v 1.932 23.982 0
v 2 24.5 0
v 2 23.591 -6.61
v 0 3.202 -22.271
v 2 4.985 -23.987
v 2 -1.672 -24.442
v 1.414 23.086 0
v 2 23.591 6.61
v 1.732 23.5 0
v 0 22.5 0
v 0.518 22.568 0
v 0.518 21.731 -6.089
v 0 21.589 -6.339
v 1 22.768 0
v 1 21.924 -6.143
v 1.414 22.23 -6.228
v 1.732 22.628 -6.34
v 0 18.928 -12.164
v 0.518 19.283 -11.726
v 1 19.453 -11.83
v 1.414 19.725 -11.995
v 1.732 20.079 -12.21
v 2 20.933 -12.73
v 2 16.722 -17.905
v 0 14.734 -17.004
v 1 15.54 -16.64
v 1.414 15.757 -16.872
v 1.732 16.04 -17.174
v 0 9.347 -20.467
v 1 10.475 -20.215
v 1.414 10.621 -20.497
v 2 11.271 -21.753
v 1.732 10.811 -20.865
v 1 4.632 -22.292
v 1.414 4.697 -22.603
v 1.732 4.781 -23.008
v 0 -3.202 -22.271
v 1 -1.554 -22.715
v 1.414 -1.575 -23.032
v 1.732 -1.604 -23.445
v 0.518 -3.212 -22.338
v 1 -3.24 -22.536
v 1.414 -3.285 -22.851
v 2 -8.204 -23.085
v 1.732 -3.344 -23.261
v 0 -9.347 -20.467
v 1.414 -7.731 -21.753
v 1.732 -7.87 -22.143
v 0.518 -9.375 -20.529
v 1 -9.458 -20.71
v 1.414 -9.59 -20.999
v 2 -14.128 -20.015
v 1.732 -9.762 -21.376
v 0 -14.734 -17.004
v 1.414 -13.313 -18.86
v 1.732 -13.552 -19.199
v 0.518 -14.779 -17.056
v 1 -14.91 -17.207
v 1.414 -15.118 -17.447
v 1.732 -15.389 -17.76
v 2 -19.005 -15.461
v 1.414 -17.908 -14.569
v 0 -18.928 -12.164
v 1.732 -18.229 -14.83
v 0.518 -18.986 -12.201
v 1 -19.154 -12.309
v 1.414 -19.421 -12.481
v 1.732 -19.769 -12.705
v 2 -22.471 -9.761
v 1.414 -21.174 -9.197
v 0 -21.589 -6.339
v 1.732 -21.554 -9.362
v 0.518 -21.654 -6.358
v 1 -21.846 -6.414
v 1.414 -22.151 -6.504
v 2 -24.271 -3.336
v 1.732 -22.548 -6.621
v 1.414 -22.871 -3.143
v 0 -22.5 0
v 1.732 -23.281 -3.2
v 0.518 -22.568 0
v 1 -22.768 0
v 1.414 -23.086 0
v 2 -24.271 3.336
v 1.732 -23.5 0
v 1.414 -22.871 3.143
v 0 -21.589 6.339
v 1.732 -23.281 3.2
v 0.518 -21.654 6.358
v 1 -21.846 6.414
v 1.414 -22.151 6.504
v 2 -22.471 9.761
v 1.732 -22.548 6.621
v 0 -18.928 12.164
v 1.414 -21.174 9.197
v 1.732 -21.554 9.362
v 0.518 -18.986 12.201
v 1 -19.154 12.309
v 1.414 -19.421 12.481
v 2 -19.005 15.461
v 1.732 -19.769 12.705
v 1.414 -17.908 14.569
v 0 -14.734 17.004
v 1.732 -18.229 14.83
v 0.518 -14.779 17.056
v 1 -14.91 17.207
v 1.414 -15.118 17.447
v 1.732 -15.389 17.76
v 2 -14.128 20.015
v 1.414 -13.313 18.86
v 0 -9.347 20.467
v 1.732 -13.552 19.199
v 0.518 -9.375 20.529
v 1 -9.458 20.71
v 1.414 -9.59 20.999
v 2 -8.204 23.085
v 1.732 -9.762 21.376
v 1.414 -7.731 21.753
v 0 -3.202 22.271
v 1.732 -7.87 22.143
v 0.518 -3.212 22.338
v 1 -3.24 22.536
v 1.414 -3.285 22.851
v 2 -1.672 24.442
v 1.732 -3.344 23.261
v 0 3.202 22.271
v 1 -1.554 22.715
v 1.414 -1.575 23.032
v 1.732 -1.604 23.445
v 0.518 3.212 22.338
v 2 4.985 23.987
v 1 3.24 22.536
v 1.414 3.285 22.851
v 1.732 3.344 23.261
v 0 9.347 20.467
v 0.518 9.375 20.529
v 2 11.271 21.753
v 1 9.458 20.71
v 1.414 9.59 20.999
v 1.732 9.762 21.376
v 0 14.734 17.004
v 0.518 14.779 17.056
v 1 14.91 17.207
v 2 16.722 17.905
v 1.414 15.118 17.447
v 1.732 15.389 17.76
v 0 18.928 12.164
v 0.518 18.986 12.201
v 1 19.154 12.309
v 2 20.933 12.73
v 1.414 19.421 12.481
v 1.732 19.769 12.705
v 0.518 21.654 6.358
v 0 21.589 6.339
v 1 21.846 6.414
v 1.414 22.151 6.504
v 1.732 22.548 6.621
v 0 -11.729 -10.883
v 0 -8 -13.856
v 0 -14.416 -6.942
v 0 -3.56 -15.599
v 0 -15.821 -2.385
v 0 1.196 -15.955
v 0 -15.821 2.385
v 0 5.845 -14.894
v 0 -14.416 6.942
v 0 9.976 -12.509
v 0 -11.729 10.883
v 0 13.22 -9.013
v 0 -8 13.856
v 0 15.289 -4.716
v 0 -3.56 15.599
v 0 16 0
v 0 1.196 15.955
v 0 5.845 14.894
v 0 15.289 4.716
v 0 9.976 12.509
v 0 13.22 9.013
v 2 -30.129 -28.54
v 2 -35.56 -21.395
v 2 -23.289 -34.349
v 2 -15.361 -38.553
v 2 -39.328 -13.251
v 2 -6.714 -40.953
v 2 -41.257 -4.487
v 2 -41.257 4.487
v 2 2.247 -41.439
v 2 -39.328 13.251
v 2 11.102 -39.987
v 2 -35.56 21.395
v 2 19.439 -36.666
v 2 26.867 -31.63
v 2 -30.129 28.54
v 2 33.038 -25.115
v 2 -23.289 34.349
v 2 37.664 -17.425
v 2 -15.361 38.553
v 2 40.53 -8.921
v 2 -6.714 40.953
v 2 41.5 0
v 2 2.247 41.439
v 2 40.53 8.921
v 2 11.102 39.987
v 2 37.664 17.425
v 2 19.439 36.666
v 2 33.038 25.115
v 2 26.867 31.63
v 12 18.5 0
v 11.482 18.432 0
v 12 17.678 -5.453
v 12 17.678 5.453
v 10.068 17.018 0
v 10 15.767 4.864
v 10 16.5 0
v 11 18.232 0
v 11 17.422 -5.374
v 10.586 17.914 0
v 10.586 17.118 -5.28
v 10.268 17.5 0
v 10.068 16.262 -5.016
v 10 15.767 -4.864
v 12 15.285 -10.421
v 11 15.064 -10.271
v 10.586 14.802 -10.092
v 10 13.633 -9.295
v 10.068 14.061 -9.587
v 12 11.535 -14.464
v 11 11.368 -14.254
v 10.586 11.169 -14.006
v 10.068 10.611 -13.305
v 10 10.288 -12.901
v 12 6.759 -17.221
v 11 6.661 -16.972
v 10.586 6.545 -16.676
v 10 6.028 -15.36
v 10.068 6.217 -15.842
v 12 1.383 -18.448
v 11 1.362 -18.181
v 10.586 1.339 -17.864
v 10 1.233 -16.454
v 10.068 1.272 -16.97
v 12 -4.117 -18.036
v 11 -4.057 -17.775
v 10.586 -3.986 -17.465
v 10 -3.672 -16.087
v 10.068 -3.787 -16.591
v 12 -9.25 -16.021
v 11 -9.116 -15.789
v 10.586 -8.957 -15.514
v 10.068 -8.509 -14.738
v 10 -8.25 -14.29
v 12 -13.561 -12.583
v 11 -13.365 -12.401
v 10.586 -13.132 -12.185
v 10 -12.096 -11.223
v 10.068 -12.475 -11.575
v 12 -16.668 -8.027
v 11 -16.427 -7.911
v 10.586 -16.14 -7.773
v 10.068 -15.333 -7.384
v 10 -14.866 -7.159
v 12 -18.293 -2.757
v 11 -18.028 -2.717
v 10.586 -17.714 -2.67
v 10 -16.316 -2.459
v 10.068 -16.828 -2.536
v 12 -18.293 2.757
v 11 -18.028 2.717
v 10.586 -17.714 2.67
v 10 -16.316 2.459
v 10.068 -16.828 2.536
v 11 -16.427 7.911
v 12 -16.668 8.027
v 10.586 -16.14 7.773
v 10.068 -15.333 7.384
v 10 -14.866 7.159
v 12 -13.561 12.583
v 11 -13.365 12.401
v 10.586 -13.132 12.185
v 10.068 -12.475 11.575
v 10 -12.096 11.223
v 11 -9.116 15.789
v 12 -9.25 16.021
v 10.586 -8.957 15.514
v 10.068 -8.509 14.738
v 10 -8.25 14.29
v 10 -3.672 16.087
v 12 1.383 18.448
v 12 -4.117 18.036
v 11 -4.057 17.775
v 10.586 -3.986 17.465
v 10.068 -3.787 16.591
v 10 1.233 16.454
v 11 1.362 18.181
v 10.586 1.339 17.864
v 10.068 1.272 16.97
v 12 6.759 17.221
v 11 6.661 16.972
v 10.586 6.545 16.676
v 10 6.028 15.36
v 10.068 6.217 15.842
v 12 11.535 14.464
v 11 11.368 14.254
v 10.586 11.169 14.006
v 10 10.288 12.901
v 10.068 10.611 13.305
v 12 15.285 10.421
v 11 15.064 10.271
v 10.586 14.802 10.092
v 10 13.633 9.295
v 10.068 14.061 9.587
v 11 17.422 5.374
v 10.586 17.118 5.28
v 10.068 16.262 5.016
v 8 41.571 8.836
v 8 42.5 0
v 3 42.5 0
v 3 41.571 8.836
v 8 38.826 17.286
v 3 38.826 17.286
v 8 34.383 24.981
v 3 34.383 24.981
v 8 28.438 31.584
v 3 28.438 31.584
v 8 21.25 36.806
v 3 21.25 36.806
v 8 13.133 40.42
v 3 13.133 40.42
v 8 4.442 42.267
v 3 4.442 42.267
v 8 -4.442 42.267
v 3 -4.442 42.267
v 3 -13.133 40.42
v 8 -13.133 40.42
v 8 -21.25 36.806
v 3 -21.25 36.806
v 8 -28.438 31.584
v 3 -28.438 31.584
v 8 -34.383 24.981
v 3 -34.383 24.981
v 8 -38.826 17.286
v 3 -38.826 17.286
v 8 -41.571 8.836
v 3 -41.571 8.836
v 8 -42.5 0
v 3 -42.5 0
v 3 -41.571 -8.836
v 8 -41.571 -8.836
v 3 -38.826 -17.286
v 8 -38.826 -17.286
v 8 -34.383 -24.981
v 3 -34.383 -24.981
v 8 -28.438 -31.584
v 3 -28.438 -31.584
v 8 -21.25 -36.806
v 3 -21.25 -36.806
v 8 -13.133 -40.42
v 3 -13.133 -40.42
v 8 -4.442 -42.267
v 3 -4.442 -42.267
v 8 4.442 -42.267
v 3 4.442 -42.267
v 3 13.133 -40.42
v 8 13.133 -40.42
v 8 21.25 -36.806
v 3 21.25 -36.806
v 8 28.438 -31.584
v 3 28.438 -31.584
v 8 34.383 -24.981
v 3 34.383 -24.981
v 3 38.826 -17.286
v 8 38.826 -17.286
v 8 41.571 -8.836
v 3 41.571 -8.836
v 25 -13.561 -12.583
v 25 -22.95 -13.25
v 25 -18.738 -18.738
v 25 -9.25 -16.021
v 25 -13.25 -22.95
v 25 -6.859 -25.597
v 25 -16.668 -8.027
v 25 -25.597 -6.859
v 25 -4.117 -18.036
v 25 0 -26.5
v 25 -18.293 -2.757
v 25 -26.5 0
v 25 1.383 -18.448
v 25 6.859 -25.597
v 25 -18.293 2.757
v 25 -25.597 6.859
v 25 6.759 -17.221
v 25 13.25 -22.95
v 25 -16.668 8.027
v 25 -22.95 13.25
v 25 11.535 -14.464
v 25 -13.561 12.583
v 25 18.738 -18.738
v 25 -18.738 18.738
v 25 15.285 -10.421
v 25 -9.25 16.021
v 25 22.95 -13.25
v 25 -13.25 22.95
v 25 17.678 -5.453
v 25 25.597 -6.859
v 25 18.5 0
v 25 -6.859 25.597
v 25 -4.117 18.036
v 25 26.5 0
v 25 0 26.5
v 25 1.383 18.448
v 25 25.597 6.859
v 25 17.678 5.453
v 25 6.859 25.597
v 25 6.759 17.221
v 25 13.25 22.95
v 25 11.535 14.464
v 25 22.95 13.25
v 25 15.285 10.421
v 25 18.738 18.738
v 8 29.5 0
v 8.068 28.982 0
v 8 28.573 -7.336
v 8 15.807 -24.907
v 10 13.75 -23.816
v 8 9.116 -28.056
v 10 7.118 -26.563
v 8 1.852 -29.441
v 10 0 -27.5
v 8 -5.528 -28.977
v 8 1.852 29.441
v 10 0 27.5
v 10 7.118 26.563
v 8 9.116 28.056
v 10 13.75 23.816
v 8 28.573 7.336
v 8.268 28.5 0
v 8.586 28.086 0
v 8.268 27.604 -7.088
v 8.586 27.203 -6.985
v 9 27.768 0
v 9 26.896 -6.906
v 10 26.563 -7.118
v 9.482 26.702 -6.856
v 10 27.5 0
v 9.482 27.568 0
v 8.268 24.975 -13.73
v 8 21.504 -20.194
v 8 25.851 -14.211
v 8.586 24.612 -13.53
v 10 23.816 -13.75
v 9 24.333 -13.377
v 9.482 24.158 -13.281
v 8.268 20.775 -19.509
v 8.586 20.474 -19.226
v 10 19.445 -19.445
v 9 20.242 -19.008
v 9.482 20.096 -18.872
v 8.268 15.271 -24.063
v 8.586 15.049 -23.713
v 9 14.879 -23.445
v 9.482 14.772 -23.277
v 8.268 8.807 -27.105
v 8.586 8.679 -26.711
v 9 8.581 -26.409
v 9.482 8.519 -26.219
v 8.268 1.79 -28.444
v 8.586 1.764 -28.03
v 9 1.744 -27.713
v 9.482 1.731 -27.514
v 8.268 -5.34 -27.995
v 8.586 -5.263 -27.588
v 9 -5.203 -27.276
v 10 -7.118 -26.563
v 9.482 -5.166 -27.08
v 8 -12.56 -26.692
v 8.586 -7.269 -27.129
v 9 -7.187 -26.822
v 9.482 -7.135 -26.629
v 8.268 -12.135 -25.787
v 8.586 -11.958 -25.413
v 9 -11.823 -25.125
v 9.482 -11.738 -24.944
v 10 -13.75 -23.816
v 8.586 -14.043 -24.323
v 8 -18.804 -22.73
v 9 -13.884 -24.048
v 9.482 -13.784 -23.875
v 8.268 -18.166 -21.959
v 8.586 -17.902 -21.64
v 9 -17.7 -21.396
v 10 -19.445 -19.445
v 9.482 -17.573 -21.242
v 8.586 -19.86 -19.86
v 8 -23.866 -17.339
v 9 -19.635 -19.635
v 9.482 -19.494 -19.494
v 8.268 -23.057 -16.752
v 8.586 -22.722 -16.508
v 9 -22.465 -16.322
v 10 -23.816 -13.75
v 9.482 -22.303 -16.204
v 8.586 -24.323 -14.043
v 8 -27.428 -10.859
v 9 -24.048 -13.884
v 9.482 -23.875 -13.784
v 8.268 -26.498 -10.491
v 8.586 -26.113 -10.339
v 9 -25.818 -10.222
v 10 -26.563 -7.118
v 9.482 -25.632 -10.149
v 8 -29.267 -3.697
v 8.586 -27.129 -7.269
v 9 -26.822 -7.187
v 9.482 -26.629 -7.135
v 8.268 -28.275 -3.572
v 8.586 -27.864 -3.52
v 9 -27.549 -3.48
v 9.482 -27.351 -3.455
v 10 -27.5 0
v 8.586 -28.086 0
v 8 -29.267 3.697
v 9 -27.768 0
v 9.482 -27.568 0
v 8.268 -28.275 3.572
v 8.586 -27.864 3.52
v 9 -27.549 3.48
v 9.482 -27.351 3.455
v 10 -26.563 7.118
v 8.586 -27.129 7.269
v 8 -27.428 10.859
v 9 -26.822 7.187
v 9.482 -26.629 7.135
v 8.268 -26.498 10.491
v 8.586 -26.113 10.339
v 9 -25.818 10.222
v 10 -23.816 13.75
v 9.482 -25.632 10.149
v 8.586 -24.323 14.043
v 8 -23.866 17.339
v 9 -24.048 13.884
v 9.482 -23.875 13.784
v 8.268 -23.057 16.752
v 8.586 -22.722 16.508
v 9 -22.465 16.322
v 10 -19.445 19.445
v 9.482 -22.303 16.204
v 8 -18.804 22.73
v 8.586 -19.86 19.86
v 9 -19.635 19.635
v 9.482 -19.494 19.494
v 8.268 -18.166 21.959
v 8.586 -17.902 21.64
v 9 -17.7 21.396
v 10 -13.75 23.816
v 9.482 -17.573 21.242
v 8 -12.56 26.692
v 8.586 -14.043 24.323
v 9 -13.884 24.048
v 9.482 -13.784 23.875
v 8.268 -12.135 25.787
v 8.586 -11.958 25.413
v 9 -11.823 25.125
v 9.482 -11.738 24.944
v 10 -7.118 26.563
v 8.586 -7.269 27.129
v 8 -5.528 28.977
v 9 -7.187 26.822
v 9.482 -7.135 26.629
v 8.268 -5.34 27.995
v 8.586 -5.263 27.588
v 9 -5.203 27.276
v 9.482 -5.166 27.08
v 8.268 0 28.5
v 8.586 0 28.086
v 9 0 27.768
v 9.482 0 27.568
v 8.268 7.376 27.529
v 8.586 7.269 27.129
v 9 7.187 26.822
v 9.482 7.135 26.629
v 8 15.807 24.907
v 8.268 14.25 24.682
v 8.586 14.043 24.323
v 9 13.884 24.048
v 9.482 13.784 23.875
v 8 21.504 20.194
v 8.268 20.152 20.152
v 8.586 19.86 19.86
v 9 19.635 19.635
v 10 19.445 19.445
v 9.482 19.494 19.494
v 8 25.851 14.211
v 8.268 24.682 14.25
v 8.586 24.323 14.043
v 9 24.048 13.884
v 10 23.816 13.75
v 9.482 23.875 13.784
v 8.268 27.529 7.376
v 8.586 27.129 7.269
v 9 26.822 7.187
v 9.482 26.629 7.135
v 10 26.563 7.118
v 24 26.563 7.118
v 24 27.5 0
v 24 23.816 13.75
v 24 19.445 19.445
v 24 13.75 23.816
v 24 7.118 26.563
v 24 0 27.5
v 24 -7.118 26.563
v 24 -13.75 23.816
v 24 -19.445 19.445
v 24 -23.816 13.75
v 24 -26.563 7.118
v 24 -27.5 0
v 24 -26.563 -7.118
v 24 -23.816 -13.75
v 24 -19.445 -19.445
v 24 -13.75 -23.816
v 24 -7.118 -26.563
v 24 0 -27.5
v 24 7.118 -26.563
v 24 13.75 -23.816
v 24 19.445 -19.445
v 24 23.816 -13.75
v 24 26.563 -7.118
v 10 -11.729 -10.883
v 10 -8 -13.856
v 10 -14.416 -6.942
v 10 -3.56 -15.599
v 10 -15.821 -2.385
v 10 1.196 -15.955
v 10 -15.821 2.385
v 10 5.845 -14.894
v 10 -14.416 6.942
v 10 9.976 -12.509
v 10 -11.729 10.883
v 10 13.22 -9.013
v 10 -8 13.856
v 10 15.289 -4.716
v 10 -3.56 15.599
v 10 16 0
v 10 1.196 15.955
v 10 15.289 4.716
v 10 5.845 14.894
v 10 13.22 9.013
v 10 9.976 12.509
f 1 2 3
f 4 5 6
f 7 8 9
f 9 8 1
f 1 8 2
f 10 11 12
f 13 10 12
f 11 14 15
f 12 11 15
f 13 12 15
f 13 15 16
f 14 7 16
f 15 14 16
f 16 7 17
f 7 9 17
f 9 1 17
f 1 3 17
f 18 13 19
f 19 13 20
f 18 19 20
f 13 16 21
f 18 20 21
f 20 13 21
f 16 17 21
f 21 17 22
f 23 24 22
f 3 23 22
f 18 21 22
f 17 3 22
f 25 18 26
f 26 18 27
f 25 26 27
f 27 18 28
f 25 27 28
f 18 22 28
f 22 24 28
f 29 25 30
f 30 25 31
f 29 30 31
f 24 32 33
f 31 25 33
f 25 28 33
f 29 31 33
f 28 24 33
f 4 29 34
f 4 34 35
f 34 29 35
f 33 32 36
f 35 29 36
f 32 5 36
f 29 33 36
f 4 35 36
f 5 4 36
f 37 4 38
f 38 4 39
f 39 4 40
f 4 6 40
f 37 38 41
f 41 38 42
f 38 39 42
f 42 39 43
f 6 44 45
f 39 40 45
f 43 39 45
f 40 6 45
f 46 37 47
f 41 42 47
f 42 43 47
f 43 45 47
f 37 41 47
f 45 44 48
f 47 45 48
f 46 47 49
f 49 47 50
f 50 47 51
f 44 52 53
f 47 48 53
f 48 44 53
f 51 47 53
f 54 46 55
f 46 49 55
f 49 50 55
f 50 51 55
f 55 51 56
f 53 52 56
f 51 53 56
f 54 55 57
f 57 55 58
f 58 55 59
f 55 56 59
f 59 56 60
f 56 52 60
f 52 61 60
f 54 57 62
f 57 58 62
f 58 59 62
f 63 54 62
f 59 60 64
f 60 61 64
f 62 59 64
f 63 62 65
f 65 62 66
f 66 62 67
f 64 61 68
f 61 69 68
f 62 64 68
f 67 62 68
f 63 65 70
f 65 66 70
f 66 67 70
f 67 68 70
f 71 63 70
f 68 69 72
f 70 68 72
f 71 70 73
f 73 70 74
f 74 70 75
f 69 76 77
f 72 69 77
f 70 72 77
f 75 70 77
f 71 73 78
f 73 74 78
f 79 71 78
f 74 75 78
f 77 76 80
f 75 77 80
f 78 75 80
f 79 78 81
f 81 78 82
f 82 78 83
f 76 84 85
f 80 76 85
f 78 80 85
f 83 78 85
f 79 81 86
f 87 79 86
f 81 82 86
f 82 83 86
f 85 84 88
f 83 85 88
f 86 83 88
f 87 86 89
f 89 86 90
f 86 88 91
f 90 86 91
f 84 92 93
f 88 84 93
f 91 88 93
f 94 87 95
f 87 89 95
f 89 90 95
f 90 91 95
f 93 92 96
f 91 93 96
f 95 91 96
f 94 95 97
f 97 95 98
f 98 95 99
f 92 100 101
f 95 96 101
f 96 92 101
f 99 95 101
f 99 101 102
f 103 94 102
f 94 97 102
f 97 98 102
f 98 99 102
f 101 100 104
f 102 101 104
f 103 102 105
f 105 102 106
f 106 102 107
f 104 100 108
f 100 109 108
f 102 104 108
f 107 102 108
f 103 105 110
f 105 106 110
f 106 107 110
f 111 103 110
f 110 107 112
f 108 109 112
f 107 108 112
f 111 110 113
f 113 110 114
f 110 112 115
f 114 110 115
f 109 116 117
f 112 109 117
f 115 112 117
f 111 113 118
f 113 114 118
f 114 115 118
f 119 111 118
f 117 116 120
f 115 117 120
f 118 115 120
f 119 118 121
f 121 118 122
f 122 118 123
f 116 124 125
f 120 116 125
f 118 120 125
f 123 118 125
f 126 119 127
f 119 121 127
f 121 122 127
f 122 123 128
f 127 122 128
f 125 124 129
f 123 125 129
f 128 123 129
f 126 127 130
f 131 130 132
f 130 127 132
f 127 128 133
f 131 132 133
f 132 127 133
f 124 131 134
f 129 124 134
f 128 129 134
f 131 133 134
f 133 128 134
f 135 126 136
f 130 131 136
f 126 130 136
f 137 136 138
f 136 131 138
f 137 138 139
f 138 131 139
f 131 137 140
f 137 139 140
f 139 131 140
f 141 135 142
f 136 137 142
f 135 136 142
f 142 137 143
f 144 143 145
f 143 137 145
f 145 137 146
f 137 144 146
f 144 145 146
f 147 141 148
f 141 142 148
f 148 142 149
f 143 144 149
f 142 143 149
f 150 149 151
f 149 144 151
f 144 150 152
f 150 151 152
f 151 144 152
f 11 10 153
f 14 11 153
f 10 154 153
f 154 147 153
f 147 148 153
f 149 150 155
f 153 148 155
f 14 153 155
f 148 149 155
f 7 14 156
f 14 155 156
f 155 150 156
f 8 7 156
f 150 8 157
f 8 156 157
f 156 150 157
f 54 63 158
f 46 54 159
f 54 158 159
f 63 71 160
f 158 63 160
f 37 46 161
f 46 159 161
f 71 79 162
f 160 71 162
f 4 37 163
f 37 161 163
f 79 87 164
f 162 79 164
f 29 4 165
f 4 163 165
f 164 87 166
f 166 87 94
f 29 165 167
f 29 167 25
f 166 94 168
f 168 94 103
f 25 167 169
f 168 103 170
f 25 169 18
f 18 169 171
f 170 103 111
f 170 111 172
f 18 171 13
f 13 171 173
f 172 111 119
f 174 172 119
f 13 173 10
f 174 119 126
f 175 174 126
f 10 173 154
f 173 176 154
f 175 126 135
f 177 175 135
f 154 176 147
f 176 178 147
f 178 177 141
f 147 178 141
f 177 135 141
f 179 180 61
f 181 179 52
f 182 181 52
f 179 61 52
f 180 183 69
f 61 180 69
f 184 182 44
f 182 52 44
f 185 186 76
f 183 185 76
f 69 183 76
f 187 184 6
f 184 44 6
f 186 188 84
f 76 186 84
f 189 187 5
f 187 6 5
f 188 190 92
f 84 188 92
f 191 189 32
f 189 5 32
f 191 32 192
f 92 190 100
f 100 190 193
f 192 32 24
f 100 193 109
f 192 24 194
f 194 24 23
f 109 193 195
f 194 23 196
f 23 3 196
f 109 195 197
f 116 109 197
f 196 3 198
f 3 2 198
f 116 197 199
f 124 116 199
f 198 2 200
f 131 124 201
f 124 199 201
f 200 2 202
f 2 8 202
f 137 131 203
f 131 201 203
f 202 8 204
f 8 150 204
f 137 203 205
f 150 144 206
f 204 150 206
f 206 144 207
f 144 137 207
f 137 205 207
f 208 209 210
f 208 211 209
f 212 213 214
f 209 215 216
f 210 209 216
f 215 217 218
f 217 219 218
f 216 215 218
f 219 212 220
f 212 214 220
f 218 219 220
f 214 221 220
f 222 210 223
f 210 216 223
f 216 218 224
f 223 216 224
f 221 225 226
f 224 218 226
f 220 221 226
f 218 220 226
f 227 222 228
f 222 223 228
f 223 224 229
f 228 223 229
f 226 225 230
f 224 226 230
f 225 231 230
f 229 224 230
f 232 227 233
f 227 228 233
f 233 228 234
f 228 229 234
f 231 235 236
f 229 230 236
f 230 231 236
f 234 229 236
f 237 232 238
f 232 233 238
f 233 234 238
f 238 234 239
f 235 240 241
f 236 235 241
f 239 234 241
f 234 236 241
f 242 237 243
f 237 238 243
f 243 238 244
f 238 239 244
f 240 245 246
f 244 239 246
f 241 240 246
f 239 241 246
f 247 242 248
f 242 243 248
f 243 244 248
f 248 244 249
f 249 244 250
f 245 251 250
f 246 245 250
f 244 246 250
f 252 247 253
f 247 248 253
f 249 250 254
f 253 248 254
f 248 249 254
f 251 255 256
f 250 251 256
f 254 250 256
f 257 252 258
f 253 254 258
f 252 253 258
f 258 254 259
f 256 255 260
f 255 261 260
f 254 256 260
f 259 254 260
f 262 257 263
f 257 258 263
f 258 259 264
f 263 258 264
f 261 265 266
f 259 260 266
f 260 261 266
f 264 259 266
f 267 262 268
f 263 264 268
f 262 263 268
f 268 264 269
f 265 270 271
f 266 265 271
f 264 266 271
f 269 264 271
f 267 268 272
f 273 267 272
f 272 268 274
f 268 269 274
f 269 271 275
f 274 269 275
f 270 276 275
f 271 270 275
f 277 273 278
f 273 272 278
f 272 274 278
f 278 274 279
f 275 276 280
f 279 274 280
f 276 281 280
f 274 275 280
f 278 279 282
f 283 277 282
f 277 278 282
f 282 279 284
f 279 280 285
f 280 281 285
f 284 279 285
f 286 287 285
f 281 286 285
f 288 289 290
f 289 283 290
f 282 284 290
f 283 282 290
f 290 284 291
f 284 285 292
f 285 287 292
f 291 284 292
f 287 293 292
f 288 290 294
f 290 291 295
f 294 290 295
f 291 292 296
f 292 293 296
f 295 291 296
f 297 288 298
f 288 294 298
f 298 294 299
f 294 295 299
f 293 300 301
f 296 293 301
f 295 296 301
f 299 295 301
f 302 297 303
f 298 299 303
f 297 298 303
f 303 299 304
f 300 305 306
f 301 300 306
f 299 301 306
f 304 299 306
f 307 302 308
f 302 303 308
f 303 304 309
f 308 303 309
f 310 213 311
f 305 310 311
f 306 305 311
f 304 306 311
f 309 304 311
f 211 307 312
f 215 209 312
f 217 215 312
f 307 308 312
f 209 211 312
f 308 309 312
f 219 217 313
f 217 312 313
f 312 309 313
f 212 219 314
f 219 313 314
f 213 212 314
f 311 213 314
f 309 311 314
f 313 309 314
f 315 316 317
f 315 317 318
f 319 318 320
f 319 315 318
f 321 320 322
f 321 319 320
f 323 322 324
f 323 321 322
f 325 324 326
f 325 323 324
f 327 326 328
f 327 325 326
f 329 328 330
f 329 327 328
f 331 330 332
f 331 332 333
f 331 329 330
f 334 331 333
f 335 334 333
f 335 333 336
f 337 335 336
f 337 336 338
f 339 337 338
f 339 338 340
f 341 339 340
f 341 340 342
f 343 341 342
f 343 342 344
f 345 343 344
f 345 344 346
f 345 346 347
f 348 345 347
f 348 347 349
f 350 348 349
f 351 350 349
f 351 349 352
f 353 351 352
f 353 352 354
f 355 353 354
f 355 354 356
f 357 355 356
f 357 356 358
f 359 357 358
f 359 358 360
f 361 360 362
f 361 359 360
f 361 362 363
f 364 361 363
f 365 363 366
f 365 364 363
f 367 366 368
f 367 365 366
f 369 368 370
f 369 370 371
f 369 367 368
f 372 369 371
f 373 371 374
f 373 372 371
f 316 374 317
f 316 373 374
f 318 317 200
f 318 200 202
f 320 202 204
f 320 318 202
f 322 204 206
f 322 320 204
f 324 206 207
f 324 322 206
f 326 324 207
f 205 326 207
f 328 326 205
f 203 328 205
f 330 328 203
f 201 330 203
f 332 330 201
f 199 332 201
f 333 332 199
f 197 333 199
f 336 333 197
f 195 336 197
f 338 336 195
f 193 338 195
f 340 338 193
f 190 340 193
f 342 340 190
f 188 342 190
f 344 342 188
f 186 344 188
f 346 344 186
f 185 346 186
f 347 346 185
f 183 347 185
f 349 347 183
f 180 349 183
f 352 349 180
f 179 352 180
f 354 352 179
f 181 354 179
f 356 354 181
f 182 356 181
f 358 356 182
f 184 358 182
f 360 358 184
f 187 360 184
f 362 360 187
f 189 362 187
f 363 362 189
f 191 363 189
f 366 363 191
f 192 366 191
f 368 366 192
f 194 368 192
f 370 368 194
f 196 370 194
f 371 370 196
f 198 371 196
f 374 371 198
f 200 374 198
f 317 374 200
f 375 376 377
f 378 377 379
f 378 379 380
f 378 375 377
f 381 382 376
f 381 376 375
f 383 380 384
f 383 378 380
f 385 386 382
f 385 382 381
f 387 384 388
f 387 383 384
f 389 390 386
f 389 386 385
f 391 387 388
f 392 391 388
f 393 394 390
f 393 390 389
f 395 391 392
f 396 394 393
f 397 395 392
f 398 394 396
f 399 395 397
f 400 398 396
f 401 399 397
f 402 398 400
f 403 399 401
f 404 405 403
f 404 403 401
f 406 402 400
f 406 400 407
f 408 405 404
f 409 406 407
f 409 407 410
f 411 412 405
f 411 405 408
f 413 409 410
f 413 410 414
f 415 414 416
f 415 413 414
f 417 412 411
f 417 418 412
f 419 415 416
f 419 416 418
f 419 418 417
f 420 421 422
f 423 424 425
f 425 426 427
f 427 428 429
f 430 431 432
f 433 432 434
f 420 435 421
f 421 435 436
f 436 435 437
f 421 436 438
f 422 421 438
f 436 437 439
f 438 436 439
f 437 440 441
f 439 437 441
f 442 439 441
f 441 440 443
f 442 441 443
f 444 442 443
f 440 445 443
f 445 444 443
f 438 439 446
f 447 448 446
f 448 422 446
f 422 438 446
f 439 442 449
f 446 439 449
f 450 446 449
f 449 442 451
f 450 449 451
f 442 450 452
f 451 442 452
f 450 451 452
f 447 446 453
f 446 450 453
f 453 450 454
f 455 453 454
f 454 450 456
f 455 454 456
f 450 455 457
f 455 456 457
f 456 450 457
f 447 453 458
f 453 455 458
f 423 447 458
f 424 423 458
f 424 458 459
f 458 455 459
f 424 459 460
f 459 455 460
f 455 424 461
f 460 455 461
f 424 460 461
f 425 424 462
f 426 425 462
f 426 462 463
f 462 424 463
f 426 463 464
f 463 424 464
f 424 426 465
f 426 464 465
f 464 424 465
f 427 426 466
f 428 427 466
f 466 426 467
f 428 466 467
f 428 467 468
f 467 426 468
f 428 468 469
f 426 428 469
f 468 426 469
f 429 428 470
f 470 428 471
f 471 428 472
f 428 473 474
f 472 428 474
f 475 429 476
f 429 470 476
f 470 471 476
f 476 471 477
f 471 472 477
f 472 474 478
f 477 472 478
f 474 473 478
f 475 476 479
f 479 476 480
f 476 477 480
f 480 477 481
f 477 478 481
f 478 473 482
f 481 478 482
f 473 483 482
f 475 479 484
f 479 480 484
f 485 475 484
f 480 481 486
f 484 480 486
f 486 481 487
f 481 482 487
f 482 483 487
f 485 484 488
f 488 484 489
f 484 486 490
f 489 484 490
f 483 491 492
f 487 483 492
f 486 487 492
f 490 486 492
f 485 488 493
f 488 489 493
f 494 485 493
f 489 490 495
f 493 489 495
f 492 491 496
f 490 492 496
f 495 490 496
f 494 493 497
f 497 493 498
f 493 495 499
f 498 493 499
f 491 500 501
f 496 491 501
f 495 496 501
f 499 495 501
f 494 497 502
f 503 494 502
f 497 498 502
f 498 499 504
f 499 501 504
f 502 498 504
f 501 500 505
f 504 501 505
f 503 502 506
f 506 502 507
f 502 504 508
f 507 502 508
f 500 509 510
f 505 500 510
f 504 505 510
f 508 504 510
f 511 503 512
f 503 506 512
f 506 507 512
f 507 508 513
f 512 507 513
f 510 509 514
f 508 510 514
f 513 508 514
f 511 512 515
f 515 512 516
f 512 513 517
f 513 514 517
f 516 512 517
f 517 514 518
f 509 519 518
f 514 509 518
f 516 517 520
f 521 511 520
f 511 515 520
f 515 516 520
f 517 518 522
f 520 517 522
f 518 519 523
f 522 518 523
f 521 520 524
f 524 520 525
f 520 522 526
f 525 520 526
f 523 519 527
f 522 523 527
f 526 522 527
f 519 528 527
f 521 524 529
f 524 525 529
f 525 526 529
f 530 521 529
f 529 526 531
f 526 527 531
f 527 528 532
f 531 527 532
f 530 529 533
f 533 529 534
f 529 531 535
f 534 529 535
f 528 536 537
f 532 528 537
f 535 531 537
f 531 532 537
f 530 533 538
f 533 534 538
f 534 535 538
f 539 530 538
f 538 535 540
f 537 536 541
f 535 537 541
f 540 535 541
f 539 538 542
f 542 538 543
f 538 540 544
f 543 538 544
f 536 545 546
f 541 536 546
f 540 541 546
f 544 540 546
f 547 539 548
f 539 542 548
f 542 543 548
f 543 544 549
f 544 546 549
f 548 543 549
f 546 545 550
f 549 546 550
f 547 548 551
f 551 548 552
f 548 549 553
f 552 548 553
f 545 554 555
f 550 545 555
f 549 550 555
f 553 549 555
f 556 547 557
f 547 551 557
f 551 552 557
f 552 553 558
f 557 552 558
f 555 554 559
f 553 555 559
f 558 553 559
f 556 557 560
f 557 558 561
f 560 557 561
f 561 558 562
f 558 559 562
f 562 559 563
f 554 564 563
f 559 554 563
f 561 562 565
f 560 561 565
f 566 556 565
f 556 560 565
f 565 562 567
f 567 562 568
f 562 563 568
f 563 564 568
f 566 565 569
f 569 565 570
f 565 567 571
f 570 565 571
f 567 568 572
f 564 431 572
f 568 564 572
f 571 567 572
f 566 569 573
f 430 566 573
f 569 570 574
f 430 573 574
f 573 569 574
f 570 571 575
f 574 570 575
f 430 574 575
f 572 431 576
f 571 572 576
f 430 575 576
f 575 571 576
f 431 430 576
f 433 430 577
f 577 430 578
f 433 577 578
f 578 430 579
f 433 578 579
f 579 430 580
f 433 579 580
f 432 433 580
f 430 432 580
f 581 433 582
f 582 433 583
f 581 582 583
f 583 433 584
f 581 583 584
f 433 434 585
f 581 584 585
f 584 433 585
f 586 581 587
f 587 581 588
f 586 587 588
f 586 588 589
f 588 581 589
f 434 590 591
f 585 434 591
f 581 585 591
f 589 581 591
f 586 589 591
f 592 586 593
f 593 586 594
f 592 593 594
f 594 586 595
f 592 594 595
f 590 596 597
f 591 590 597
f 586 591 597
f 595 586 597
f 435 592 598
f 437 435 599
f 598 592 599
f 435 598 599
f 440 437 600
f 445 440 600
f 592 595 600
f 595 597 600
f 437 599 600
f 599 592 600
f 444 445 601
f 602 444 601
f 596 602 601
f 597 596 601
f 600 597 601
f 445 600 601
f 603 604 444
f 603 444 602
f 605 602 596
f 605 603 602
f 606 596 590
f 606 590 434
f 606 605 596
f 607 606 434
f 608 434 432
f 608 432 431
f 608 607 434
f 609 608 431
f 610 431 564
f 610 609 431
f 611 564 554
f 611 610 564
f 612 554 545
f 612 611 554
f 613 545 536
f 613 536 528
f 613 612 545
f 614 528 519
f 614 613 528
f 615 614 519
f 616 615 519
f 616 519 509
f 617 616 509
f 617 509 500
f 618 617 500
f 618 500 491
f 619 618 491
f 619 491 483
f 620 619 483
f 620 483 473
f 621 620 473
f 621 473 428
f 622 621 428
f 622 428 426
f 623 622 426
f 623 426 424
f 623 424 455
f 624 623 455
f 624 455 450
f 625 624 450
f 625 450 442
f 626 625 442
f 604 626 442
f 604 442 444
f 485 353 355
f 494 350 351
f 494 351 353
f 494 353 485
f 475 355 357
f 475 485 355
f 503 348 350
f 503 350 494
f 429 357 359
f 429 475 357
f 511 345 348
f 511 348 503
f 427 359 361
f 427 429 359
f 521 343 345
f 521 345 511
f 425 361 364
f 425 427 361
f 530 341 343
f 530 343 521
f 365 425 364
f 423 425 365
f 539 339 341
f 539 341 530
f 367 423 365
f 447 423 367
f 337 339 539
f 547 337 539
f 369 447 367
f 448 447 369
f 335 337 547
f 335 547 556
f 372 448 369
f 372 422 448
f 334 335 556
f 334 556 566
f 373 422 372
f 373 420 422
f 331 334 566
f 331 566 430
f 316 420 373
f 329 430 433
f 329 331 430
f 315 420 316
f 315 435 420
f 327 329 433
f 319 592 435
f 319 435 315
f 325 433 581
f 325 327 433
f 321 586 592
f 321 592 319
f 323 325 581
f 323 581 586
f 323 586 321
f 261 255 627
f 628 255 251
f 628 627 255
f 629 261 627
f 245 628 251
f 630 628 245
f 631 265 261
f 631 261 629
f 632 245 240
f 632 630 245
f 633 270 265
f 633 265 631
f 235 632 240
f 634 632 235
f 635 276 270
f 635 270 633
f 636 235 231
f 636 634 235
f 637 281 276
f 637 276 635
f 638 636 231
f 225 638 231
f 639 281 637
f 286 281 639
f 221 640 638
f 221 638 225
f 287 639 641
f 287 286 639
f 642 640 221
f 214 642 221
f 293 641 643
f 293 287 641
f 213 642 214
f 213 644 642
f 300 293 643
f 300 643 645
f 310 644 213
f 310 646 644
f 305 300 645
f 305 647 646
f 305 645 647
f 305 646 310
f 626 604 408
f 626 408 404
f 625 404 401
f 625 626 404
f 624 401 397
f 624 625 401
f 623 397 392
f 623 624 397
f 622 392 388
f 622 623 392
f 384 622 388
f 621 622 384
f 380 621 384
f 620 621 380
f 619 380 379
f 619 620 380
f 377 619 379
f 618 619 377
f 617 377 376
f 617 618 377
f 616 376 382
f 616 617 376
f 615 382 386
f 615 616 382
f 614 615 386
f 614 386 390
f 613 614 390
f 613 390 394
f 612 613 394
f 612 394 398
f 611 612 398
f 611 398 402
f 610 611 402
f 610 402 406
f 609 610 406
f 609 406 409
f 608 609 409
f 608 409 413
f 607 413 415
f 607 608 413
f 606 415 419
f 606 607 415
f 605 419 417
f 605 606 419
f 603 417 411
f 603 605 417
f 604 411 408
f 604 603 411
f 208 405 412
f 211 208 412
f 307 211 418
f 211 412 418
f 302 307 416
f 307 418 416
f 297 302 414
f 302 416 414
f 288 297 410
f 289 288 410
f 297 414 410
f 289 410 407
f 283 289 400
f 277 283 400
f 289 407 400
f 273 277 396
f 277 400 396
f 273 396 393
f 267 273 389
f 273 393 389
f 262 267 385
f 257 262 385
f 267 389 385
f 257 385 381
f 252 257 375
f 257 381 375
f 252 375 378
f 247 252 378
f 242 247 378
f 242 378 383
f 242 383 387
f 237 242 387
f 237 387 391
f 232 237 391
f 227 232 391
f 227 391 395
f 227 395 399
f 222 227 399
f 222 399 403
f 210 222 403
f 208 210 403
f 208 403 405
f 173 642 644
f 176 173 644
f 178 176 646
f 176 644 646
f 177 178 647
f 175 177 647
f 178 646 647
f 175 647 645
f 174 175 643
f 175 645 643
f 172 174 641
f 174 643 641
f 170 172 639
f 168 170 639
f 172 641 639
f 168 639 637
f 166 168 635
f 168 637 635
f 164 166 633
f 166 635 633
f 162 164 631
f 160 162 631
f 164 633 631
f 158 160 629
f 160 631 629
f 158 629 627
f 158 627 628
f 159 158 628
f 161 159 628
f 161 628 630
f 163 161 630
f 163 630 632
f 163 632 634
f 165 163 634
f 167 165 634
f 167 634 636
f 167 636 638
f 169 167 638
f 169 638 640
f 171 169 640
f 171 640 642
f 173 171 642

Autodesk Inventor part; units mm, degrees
ref_plane "YZ Plane" through (0, 0, 0) normal (1, 0, 0) x (0, 1, 0)
ref_plane "XZ Plane" through (0, 0, 0) normal (0, 1, 0) x (-1, 0, 0)
ref_plane "XY Plane" through (0, 0, 0) normal (0, 0, 1) x (1, 0, 0)
sketch "Sketch1" plane through (0, 0, 0) normal (0, 0, 1) x (1, 0, 0)
  line L0 (0, 0) -> (25.981, 0)
  line L1 (0, 16) -> (10, 16)
  line L2 (10, 16) -> (10, 18.5)
  line L3 (10, 18.5) -> (25, 18.5)
  line L4 (0, 22.5) -> (0, 16)
  line L5 (2, 22.5) -> (2, 42.5)
  line L6 (2, 42.5) -> (8, 42.5)
  line L7 (8, 42.5) -> (8, 27.5)
  line L8 (8, 27.5) -> (25, 27.5)
  line L9 (25, 27.5) -> (25, 18.5)
  line L10 (0, 22.5) -> (2, 22.5)
  dimension "d0" = 32
  dimension "d2" = 37
  dimension "d5" = 15
  dimension "d7" = 6
  dimension "d9" = 85
  dimension "d11" = 55
  dimension "d12" = 45
  dimension "d13" = 25
  dimension "d14" = 8
revolve "Revolution1" add sketch "Sketch1" angle 360 about axis through (0, 0, 0) along (1, 0, 0)
fillet "Fillet1" radius 2 3 edges at (2, -22.5, 0) (10, -18.5, 0) (8, -27.5, 0)
chamfer "Chamfer2" distance 1 angle 45 2 edges at (25, -27.5, 0) (2, -42.5, 0)
properties part number "CoverInput"
